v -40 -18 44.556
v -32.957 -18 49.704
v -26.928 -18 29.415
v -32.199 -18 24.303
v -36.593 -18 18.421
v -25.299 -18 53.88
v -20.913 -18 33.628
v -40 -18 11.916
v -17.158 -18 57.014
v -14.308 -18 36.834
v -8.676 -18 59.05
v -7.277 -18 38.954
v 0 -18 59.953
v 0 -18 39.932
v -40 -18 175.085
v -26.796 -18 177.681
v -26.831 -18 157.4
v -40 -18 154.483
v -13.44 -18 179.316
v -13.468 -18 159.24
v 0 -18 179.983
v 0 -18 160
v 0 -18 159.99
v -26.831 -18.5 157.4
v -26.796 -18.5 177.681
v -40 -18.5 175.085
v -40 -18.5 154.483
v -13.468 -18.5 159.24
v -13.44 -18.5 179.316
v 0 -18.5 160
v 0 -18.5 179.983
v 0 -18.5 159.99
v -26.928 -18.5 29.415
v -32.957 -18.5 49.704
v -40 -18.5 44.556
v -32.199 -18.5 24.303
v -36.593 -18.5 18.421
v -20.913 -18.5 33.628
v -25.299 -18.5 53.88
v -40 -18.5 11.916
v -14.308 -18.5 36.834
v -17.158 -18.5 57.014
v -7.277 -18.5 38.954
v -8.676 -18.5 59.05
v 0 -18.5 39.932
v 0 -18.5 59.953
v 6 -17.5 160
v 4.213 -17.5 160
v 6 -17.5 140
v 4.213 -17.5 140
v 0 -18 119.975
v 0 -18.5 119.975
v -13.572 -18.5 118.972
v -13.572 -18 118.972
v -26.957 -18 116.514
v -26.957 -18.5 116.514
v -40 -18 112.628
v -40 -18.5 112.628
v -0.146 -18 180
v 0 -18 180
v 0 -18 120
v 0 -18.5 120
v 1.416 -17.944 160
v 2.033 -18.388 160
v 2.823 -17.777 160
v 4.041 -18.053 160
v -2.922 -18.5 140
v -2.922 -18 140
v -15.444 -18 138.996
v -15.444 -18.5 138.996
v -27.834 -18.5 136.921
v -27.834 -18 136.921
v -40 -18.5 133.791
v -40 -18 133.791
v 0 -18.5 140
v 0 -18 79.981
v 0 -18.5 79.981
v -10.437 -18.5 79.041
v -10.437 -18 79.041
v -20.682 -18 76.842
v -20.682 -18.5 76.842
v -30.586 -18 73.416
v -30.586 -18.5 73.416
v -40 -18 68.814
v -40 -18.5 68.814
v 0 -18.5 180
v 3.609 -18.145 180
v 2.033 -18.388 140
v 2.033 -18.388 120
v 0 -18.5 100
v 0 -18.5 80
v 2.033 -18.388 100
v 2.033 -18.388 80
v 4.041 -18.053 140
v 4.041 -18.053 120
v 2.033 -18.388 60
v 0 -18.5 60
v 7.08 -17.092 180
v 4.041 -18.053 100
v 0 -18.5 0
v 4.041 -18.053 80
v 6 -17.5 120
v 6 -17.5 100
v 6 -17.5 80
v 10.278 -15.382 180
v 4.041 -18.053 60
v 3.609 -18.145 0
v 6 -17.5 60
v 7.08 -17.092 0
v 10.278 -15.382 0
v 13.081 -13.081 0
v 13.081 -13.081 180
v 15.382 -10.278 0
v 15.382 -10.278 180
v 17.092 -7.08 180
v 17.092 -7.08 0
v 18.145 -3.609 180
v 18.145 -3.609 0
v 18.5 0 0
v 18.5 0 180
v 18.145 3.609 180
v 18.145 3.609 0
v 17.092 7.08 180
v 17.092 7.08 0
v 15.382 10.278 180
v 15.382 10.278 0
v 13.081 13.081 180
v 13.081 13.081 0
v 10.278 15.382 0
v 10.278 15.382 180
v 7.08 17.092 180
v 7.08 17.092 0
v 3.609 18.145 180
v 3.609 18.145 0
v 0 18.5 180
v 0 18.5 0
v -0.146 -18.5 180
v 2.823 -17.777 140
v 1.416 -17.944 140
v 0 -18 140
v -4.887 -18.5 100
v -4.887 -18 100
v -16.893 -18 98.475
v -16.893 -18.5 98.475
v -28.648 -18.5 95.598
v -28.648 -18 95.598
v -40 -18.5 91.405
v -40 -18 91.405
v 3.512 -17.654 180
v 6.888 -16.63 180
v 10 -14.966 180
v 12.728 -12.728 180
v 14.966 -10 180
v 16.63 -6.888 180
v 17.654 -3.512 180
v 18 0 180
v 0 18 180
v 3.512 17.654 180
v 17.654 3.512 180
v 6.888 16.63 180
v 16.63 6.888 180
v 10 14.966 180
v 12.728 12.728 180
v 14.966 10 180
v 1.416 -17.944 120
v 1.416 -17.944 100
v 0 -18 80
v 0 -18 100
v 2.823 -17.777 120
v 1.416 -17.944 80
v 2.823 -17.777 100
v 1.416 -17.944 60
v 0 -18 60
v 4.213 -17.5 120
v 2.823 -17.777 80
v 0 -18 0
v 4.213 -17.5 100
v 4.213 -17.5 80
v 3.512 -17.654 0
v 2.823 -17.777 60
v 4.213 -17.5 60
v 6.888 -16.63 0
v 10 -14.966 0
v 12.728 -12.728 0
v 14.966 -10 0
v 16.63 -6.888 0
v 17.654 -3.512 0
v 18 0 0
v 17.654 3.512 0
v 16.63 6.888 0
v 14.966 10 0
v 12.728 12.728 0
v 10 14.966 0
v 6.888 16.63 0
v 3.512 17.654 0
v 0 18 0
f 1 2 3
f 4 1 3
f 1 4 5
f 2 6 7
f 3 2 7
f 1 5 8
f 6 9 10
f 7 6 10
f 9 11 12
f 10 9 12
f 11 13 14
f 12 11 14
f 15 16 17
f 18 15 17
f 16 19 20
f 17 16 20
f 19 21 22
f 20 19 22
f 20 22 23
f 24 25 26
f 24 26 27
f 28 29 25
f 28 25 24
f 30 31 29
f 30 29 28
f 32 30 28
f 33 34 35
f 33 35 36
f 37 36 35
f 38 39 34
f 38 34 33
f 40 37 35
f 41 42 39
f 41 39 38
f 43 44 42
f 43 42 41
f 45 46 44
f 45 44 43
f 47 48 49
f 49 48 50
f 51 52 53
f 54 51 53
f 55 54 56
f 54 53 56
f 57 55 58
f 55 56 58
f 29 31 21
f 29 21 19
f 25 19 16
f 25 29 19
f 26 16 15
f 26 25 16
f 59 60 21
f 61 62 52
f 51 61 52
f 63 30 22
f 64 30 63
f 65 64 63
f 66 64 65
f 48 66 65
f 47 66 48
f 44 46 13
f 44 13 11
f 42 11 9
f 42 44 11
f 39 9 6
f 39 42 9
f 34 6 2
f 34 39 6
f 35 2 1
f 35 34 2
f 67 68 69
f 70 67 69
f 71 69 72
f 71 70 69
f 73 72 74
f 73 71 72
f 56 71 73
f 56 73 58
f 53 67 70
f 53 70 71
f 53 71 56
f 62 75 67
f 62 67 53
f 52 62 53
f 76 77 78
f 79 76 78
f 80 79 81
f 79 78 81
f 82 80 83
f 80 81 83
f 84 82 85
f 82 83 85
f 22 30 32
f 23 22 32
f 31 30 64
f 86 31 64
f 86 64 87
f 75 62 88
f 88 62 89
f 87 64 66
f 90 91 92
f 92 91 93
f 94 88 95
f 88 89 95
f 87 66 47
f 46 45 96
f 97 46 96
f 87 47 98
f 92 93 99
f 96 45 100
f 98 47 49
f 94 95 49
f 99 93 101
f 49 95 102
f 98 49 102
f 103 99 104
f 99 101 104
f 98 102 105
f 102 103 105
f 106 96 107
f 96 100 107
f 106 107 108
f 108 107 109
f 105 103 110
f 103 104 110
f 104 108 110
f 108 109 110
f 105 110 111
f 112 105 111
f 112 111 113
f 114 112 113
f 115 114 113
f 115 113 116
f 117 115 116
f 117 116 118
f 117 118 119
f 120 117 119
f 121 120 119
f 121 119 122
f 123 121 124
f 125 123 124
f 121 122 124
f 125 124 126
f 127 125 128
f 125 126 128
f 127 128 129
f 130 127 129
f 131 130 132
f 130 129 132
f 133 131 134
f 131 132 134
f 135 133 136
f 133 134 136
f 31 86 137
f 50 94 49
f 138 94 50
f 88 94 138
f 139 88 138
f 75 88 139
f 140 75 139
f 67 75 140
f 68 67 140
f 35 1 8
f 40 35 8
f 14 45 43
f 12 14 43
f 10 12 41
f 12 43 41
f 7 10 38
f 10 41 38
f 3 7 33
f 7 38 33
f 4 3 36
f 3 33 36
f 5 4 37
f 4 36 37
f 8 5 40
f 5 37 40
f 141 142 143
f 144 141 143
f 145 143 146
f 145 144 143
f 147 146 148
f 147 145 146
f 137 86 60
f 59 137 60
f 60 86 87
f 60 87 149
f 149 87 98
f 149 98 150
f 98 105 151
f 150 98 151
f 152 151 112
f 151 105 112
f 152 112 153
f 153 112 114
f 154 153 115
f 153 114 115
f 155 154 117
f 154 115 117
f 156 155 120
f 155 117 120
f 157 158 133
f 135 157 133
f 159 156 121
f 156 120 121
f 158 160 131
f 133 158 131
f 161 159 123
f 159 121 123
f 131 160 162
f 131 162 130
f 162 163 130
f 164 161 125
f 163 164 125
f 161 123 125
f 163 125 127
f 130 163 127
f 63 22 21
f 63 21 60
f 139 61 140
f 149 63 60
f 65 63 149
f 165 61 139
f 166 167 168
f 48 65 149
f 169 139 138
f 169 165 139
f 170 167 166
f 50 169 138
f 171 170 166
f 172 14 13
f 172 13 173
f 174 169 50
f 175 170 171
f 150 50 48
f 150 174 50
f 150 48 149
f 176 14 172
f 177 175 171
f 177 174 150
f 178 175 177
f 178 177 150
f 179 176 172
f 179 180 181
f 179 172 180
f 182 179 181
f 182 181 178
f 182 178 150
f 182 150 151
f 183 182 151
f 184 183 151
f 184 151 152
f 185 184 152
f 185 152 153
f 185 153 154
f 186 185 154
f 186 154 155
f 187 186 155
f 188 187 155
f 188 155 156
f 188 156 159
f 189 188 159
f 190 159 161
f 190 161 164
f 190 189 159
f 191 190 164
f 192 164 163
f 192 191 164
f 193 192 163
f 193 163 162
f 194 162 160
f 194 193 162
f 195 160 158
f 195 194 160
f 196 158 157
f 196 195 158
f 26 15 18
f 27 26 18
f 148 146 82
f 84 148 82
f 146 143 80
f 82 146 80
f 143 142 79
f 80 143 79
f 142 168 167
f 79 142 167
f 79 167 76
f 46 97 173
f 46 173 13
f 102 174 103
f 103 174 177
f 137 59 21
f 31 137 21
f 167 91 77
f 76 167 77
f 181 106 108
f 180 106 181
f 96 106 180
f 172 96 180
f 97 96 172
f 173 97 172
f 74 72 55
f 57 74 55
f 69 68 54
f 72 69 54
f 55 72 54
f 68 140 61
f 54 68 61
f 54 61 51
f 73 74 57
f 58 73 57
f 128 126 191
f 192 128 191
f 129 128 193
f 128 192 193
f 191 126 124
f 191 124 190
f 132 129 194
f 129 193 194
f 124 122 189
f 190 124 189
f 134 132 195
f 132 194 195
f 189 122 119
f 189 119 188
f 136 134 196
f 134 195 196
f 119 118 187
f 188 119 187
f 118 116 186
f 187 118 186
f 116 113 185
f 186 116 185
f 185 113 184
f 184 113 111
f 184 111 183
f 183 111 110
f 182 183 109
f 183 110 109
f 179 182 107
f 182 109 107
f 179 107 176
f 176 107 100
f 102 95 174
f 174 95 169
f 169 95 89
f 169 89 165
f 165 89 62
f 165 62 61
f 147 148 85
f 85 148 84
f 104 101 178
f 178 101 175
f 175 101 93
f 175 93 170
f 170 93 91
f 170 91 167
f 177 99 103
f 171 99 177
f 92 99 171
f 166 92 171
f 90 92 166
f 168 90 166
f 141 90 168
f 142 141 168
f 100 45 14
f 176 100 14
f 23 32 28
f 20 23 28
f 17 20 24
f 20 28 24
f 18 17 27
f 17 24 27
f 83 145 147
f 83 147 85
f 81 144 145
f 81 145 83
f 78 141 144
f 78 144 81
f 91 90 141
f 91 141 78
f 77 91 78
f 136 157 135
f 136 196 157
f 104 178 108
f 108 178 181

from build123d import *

# Parameters (mm, degrees)
SKETCH_1_R           = 18.5
SKETCH_1_R_2         = 18
EXTRUDE_1_DEPTH      = 180
SKETCH_15_W          = 19.647344242
SKETCH_15_H          = 48.423013506
CUT_EXTRUDE_7_DEPTH  = 208.5
SKETCH_16_W          = 20
SKETCH_16_H          = 0.5
EXTRUDE_4_DEPTH      = 40
SKETCH_17_W          = 20
SKETCH_17_H          = 1
CUT_EXTRUDE_8_DEPTH  = 40
EXTRUDE_8_DEPTH      = 0.5
CUT_EXTRUDE_10_DEPTH = 0.5


with BuildPart() as part:
    # 草图1 → 凸台-拉伸1 (new body)
    with BuildSketch(Plane.XY):
        with Locations(Location((0, 0, 0), (0, 0, 180))):
            Circle(SKETCH_1_R)
        with Locations(Location((0, 0, 0), (0, 0, 180))):
            Circle(SKETCH_1_R_2, mode=Mode.SUBTRACT)
    extrude(amount=EXTRUDE_1_DEPTH)

    # 草图15 → 切除-拉伸7 (cut, symmetric)
    with BuildSketch(Plane(origin=(0, 0, 0), x_dir=(-1, 0, 0), z_dir=(0, 0, -1))):
        with Locations((9.823672121, -2.226084919)):
            Rectangle(SKETCH_15_W, SKETCH_15_H)
    extrude(amount=CUT_EXTRUDE_7_DEPTH, both=True, mode=Mode.SUBTRACT)

    # 草图16 → 凸台-拉伸4 (add)
    with BuildSketch(Plane(origin=(0, 0, 0), x_dir=(0, 0, -1), z_dir=(1, 0, 0))):
        with Locations((-90, -18.25)):
            Rectangle(SKETCH_16_W, SKETCH_16_H)
        with Locations((-50, -18.25)):
            Rectangle(SKETCH_16_W, SKETCH_16_H)
        with Locations((-130, -18.25)):
            Rectangle(SKETCH_16_W, SKETCH_16_H)
        with Locations((-170, -18.25)):
            Rectangle(SKETCH_16_W, SKETCH_16_H)
    extrude(amount=-EXTRUDE_4_DEPTH)

    # 草图17 → 切除-拉伸8 (cut)
    with BuildSketch(Plane(origin=(0, 0, 0), x_dir=(0, 0, -1), z_dir=(1, 0, 0))):
        with Locations((-110, -18)):
            Rectangle(SKETCH_17_W, SKETCH_17_H)
        with Locations((-150, -18)):
            Rectangle(SKETCH_17_W, SKETCH_17_H)
        with Locations((-70, -18)):
            Rectangle(SKETCH_17_W, SKETCH_17_H)
    extrude(amount=CUT_EXTRUDE_8_DEPTH, mode=Mode.SUBTRACT)

    # 草图20 → 凸台-拉伸8 (add)
    with BuildSketch(Plane.XZ.offset(18.5)):
        with BuildLine():
            Line((0, 59.952777719), (0, 39.932309719))
            ThreePointArc((0, 39.932309719), (-24.004305164, 31.641271223), (-40, 11.916015014))
            Line((-40, 11.916015014), (-40, 44.556181889))
            ThreePointArc((-40, 44.556181889), (-21.280533863, 55.581277174), (0, 59.952777719))
        make_face()
        with BuildLine():
            Line((-40, 68.814162833), (-40, 91.125176599))
            ThreePointArc((-40, 91.125176599), (-20.430552708, 97.494887784), (0, 99.97057031))
            Line((0, 99.97057031), (0, 79.980767144))
            ThreePointArc((0, 79.980767144), (-20.682391226, 76.84186512), (-40, 68.814162833))
        make_face()
        with BuildLine():
            Line((0, 180), (0, 159.99002565))
            ThreePointArc((0, 159.99002565), (-20.167840481, 158.455833888), (-40, 154.483305373))
            Line((-40, 154.483305373), (-40, 175.102068383))
            ThreePointArc((-40, 175.102068383), (-20.132883898, 178.636258798), (0, 180))
        make_face()
        with BuildLine():
            Line((-40, 112.628405695), (-40, 133.686346725))
            ThreePointArc((-40, 133.686346725), (-20.218894936, 138.224000128), (0, 139.978623608))
            Line((0, 139.978623608), (0, 119.975235288))
            ThreePointArc((0, 119.975235288), (-20.297894119, 117.923712576), (-40, 112.628405695))
        make_face()
    extrude(amount=-EXTRUDE_8_DEPTH)

    # 草图21 → 切除-拉伸10 (cut)
    with BuildSketch(Plane.XZ.offset(18.5)):
        with BuildLine():
            Line((0, 79.980767144), (0, 59.952777719))
            ThreePointArc((0, 59.952777719), (-21.280533863, 55.581277174), (-40, 44.556181889))
            Line((-40, 44.556181889), (-40, 68.814162833))
            ThreePointArc((-40, 68.814162833), (-20.682391226, 76.84186512), (0, 79.980767144))
        make_face()
        with BuildLine():
            Line((-40, 91.405123559), (-40, 112.628405695))
            ThreePointArc((-40, 112.628405695), (-20.297894119, 117.923712576), (0, 119.975235288))
            Line((0, 119.975235288), (0, 100.22725283))
            ThreePointArc((0, 100.22725283), (-20.428312001, 97.758177426), (-40, 91.405123559))
        make_face()
        with BuildLine():
            Line((0, 159.99002565), (0, 140.07912782))
            ThreePointArc((0, 140.07912782), (-20.218582252, 138.325773675), (-40, 133.791368433))
            Line((-40, 133.791368433), (-40, 154.483305373))
            ThreePointArc((-40, 154.483305373), (-20.167840481, 158.455833888), (0, 159.99002565))
        make_face()
        with BuildLine():
            Line((-40, 175.084831136), (-40, 180))
            Line((-40, 180), (-40, 184.582306451))
            Line((-40, 184.582306451), (-35.32938599, 184.045292069))
            Line((-35.32938599, 184.045292069), (0, 179.983216215))
            ThreePointArc((0, 179.983216215), (-20.132908432, 178.619348164), (-40, 175.084831136))
        make_face()
    extrude(amount=-CUT_EXTRUDE_10_DEPTH, mode=Mode.SUBTRACT)


solid = part.part
